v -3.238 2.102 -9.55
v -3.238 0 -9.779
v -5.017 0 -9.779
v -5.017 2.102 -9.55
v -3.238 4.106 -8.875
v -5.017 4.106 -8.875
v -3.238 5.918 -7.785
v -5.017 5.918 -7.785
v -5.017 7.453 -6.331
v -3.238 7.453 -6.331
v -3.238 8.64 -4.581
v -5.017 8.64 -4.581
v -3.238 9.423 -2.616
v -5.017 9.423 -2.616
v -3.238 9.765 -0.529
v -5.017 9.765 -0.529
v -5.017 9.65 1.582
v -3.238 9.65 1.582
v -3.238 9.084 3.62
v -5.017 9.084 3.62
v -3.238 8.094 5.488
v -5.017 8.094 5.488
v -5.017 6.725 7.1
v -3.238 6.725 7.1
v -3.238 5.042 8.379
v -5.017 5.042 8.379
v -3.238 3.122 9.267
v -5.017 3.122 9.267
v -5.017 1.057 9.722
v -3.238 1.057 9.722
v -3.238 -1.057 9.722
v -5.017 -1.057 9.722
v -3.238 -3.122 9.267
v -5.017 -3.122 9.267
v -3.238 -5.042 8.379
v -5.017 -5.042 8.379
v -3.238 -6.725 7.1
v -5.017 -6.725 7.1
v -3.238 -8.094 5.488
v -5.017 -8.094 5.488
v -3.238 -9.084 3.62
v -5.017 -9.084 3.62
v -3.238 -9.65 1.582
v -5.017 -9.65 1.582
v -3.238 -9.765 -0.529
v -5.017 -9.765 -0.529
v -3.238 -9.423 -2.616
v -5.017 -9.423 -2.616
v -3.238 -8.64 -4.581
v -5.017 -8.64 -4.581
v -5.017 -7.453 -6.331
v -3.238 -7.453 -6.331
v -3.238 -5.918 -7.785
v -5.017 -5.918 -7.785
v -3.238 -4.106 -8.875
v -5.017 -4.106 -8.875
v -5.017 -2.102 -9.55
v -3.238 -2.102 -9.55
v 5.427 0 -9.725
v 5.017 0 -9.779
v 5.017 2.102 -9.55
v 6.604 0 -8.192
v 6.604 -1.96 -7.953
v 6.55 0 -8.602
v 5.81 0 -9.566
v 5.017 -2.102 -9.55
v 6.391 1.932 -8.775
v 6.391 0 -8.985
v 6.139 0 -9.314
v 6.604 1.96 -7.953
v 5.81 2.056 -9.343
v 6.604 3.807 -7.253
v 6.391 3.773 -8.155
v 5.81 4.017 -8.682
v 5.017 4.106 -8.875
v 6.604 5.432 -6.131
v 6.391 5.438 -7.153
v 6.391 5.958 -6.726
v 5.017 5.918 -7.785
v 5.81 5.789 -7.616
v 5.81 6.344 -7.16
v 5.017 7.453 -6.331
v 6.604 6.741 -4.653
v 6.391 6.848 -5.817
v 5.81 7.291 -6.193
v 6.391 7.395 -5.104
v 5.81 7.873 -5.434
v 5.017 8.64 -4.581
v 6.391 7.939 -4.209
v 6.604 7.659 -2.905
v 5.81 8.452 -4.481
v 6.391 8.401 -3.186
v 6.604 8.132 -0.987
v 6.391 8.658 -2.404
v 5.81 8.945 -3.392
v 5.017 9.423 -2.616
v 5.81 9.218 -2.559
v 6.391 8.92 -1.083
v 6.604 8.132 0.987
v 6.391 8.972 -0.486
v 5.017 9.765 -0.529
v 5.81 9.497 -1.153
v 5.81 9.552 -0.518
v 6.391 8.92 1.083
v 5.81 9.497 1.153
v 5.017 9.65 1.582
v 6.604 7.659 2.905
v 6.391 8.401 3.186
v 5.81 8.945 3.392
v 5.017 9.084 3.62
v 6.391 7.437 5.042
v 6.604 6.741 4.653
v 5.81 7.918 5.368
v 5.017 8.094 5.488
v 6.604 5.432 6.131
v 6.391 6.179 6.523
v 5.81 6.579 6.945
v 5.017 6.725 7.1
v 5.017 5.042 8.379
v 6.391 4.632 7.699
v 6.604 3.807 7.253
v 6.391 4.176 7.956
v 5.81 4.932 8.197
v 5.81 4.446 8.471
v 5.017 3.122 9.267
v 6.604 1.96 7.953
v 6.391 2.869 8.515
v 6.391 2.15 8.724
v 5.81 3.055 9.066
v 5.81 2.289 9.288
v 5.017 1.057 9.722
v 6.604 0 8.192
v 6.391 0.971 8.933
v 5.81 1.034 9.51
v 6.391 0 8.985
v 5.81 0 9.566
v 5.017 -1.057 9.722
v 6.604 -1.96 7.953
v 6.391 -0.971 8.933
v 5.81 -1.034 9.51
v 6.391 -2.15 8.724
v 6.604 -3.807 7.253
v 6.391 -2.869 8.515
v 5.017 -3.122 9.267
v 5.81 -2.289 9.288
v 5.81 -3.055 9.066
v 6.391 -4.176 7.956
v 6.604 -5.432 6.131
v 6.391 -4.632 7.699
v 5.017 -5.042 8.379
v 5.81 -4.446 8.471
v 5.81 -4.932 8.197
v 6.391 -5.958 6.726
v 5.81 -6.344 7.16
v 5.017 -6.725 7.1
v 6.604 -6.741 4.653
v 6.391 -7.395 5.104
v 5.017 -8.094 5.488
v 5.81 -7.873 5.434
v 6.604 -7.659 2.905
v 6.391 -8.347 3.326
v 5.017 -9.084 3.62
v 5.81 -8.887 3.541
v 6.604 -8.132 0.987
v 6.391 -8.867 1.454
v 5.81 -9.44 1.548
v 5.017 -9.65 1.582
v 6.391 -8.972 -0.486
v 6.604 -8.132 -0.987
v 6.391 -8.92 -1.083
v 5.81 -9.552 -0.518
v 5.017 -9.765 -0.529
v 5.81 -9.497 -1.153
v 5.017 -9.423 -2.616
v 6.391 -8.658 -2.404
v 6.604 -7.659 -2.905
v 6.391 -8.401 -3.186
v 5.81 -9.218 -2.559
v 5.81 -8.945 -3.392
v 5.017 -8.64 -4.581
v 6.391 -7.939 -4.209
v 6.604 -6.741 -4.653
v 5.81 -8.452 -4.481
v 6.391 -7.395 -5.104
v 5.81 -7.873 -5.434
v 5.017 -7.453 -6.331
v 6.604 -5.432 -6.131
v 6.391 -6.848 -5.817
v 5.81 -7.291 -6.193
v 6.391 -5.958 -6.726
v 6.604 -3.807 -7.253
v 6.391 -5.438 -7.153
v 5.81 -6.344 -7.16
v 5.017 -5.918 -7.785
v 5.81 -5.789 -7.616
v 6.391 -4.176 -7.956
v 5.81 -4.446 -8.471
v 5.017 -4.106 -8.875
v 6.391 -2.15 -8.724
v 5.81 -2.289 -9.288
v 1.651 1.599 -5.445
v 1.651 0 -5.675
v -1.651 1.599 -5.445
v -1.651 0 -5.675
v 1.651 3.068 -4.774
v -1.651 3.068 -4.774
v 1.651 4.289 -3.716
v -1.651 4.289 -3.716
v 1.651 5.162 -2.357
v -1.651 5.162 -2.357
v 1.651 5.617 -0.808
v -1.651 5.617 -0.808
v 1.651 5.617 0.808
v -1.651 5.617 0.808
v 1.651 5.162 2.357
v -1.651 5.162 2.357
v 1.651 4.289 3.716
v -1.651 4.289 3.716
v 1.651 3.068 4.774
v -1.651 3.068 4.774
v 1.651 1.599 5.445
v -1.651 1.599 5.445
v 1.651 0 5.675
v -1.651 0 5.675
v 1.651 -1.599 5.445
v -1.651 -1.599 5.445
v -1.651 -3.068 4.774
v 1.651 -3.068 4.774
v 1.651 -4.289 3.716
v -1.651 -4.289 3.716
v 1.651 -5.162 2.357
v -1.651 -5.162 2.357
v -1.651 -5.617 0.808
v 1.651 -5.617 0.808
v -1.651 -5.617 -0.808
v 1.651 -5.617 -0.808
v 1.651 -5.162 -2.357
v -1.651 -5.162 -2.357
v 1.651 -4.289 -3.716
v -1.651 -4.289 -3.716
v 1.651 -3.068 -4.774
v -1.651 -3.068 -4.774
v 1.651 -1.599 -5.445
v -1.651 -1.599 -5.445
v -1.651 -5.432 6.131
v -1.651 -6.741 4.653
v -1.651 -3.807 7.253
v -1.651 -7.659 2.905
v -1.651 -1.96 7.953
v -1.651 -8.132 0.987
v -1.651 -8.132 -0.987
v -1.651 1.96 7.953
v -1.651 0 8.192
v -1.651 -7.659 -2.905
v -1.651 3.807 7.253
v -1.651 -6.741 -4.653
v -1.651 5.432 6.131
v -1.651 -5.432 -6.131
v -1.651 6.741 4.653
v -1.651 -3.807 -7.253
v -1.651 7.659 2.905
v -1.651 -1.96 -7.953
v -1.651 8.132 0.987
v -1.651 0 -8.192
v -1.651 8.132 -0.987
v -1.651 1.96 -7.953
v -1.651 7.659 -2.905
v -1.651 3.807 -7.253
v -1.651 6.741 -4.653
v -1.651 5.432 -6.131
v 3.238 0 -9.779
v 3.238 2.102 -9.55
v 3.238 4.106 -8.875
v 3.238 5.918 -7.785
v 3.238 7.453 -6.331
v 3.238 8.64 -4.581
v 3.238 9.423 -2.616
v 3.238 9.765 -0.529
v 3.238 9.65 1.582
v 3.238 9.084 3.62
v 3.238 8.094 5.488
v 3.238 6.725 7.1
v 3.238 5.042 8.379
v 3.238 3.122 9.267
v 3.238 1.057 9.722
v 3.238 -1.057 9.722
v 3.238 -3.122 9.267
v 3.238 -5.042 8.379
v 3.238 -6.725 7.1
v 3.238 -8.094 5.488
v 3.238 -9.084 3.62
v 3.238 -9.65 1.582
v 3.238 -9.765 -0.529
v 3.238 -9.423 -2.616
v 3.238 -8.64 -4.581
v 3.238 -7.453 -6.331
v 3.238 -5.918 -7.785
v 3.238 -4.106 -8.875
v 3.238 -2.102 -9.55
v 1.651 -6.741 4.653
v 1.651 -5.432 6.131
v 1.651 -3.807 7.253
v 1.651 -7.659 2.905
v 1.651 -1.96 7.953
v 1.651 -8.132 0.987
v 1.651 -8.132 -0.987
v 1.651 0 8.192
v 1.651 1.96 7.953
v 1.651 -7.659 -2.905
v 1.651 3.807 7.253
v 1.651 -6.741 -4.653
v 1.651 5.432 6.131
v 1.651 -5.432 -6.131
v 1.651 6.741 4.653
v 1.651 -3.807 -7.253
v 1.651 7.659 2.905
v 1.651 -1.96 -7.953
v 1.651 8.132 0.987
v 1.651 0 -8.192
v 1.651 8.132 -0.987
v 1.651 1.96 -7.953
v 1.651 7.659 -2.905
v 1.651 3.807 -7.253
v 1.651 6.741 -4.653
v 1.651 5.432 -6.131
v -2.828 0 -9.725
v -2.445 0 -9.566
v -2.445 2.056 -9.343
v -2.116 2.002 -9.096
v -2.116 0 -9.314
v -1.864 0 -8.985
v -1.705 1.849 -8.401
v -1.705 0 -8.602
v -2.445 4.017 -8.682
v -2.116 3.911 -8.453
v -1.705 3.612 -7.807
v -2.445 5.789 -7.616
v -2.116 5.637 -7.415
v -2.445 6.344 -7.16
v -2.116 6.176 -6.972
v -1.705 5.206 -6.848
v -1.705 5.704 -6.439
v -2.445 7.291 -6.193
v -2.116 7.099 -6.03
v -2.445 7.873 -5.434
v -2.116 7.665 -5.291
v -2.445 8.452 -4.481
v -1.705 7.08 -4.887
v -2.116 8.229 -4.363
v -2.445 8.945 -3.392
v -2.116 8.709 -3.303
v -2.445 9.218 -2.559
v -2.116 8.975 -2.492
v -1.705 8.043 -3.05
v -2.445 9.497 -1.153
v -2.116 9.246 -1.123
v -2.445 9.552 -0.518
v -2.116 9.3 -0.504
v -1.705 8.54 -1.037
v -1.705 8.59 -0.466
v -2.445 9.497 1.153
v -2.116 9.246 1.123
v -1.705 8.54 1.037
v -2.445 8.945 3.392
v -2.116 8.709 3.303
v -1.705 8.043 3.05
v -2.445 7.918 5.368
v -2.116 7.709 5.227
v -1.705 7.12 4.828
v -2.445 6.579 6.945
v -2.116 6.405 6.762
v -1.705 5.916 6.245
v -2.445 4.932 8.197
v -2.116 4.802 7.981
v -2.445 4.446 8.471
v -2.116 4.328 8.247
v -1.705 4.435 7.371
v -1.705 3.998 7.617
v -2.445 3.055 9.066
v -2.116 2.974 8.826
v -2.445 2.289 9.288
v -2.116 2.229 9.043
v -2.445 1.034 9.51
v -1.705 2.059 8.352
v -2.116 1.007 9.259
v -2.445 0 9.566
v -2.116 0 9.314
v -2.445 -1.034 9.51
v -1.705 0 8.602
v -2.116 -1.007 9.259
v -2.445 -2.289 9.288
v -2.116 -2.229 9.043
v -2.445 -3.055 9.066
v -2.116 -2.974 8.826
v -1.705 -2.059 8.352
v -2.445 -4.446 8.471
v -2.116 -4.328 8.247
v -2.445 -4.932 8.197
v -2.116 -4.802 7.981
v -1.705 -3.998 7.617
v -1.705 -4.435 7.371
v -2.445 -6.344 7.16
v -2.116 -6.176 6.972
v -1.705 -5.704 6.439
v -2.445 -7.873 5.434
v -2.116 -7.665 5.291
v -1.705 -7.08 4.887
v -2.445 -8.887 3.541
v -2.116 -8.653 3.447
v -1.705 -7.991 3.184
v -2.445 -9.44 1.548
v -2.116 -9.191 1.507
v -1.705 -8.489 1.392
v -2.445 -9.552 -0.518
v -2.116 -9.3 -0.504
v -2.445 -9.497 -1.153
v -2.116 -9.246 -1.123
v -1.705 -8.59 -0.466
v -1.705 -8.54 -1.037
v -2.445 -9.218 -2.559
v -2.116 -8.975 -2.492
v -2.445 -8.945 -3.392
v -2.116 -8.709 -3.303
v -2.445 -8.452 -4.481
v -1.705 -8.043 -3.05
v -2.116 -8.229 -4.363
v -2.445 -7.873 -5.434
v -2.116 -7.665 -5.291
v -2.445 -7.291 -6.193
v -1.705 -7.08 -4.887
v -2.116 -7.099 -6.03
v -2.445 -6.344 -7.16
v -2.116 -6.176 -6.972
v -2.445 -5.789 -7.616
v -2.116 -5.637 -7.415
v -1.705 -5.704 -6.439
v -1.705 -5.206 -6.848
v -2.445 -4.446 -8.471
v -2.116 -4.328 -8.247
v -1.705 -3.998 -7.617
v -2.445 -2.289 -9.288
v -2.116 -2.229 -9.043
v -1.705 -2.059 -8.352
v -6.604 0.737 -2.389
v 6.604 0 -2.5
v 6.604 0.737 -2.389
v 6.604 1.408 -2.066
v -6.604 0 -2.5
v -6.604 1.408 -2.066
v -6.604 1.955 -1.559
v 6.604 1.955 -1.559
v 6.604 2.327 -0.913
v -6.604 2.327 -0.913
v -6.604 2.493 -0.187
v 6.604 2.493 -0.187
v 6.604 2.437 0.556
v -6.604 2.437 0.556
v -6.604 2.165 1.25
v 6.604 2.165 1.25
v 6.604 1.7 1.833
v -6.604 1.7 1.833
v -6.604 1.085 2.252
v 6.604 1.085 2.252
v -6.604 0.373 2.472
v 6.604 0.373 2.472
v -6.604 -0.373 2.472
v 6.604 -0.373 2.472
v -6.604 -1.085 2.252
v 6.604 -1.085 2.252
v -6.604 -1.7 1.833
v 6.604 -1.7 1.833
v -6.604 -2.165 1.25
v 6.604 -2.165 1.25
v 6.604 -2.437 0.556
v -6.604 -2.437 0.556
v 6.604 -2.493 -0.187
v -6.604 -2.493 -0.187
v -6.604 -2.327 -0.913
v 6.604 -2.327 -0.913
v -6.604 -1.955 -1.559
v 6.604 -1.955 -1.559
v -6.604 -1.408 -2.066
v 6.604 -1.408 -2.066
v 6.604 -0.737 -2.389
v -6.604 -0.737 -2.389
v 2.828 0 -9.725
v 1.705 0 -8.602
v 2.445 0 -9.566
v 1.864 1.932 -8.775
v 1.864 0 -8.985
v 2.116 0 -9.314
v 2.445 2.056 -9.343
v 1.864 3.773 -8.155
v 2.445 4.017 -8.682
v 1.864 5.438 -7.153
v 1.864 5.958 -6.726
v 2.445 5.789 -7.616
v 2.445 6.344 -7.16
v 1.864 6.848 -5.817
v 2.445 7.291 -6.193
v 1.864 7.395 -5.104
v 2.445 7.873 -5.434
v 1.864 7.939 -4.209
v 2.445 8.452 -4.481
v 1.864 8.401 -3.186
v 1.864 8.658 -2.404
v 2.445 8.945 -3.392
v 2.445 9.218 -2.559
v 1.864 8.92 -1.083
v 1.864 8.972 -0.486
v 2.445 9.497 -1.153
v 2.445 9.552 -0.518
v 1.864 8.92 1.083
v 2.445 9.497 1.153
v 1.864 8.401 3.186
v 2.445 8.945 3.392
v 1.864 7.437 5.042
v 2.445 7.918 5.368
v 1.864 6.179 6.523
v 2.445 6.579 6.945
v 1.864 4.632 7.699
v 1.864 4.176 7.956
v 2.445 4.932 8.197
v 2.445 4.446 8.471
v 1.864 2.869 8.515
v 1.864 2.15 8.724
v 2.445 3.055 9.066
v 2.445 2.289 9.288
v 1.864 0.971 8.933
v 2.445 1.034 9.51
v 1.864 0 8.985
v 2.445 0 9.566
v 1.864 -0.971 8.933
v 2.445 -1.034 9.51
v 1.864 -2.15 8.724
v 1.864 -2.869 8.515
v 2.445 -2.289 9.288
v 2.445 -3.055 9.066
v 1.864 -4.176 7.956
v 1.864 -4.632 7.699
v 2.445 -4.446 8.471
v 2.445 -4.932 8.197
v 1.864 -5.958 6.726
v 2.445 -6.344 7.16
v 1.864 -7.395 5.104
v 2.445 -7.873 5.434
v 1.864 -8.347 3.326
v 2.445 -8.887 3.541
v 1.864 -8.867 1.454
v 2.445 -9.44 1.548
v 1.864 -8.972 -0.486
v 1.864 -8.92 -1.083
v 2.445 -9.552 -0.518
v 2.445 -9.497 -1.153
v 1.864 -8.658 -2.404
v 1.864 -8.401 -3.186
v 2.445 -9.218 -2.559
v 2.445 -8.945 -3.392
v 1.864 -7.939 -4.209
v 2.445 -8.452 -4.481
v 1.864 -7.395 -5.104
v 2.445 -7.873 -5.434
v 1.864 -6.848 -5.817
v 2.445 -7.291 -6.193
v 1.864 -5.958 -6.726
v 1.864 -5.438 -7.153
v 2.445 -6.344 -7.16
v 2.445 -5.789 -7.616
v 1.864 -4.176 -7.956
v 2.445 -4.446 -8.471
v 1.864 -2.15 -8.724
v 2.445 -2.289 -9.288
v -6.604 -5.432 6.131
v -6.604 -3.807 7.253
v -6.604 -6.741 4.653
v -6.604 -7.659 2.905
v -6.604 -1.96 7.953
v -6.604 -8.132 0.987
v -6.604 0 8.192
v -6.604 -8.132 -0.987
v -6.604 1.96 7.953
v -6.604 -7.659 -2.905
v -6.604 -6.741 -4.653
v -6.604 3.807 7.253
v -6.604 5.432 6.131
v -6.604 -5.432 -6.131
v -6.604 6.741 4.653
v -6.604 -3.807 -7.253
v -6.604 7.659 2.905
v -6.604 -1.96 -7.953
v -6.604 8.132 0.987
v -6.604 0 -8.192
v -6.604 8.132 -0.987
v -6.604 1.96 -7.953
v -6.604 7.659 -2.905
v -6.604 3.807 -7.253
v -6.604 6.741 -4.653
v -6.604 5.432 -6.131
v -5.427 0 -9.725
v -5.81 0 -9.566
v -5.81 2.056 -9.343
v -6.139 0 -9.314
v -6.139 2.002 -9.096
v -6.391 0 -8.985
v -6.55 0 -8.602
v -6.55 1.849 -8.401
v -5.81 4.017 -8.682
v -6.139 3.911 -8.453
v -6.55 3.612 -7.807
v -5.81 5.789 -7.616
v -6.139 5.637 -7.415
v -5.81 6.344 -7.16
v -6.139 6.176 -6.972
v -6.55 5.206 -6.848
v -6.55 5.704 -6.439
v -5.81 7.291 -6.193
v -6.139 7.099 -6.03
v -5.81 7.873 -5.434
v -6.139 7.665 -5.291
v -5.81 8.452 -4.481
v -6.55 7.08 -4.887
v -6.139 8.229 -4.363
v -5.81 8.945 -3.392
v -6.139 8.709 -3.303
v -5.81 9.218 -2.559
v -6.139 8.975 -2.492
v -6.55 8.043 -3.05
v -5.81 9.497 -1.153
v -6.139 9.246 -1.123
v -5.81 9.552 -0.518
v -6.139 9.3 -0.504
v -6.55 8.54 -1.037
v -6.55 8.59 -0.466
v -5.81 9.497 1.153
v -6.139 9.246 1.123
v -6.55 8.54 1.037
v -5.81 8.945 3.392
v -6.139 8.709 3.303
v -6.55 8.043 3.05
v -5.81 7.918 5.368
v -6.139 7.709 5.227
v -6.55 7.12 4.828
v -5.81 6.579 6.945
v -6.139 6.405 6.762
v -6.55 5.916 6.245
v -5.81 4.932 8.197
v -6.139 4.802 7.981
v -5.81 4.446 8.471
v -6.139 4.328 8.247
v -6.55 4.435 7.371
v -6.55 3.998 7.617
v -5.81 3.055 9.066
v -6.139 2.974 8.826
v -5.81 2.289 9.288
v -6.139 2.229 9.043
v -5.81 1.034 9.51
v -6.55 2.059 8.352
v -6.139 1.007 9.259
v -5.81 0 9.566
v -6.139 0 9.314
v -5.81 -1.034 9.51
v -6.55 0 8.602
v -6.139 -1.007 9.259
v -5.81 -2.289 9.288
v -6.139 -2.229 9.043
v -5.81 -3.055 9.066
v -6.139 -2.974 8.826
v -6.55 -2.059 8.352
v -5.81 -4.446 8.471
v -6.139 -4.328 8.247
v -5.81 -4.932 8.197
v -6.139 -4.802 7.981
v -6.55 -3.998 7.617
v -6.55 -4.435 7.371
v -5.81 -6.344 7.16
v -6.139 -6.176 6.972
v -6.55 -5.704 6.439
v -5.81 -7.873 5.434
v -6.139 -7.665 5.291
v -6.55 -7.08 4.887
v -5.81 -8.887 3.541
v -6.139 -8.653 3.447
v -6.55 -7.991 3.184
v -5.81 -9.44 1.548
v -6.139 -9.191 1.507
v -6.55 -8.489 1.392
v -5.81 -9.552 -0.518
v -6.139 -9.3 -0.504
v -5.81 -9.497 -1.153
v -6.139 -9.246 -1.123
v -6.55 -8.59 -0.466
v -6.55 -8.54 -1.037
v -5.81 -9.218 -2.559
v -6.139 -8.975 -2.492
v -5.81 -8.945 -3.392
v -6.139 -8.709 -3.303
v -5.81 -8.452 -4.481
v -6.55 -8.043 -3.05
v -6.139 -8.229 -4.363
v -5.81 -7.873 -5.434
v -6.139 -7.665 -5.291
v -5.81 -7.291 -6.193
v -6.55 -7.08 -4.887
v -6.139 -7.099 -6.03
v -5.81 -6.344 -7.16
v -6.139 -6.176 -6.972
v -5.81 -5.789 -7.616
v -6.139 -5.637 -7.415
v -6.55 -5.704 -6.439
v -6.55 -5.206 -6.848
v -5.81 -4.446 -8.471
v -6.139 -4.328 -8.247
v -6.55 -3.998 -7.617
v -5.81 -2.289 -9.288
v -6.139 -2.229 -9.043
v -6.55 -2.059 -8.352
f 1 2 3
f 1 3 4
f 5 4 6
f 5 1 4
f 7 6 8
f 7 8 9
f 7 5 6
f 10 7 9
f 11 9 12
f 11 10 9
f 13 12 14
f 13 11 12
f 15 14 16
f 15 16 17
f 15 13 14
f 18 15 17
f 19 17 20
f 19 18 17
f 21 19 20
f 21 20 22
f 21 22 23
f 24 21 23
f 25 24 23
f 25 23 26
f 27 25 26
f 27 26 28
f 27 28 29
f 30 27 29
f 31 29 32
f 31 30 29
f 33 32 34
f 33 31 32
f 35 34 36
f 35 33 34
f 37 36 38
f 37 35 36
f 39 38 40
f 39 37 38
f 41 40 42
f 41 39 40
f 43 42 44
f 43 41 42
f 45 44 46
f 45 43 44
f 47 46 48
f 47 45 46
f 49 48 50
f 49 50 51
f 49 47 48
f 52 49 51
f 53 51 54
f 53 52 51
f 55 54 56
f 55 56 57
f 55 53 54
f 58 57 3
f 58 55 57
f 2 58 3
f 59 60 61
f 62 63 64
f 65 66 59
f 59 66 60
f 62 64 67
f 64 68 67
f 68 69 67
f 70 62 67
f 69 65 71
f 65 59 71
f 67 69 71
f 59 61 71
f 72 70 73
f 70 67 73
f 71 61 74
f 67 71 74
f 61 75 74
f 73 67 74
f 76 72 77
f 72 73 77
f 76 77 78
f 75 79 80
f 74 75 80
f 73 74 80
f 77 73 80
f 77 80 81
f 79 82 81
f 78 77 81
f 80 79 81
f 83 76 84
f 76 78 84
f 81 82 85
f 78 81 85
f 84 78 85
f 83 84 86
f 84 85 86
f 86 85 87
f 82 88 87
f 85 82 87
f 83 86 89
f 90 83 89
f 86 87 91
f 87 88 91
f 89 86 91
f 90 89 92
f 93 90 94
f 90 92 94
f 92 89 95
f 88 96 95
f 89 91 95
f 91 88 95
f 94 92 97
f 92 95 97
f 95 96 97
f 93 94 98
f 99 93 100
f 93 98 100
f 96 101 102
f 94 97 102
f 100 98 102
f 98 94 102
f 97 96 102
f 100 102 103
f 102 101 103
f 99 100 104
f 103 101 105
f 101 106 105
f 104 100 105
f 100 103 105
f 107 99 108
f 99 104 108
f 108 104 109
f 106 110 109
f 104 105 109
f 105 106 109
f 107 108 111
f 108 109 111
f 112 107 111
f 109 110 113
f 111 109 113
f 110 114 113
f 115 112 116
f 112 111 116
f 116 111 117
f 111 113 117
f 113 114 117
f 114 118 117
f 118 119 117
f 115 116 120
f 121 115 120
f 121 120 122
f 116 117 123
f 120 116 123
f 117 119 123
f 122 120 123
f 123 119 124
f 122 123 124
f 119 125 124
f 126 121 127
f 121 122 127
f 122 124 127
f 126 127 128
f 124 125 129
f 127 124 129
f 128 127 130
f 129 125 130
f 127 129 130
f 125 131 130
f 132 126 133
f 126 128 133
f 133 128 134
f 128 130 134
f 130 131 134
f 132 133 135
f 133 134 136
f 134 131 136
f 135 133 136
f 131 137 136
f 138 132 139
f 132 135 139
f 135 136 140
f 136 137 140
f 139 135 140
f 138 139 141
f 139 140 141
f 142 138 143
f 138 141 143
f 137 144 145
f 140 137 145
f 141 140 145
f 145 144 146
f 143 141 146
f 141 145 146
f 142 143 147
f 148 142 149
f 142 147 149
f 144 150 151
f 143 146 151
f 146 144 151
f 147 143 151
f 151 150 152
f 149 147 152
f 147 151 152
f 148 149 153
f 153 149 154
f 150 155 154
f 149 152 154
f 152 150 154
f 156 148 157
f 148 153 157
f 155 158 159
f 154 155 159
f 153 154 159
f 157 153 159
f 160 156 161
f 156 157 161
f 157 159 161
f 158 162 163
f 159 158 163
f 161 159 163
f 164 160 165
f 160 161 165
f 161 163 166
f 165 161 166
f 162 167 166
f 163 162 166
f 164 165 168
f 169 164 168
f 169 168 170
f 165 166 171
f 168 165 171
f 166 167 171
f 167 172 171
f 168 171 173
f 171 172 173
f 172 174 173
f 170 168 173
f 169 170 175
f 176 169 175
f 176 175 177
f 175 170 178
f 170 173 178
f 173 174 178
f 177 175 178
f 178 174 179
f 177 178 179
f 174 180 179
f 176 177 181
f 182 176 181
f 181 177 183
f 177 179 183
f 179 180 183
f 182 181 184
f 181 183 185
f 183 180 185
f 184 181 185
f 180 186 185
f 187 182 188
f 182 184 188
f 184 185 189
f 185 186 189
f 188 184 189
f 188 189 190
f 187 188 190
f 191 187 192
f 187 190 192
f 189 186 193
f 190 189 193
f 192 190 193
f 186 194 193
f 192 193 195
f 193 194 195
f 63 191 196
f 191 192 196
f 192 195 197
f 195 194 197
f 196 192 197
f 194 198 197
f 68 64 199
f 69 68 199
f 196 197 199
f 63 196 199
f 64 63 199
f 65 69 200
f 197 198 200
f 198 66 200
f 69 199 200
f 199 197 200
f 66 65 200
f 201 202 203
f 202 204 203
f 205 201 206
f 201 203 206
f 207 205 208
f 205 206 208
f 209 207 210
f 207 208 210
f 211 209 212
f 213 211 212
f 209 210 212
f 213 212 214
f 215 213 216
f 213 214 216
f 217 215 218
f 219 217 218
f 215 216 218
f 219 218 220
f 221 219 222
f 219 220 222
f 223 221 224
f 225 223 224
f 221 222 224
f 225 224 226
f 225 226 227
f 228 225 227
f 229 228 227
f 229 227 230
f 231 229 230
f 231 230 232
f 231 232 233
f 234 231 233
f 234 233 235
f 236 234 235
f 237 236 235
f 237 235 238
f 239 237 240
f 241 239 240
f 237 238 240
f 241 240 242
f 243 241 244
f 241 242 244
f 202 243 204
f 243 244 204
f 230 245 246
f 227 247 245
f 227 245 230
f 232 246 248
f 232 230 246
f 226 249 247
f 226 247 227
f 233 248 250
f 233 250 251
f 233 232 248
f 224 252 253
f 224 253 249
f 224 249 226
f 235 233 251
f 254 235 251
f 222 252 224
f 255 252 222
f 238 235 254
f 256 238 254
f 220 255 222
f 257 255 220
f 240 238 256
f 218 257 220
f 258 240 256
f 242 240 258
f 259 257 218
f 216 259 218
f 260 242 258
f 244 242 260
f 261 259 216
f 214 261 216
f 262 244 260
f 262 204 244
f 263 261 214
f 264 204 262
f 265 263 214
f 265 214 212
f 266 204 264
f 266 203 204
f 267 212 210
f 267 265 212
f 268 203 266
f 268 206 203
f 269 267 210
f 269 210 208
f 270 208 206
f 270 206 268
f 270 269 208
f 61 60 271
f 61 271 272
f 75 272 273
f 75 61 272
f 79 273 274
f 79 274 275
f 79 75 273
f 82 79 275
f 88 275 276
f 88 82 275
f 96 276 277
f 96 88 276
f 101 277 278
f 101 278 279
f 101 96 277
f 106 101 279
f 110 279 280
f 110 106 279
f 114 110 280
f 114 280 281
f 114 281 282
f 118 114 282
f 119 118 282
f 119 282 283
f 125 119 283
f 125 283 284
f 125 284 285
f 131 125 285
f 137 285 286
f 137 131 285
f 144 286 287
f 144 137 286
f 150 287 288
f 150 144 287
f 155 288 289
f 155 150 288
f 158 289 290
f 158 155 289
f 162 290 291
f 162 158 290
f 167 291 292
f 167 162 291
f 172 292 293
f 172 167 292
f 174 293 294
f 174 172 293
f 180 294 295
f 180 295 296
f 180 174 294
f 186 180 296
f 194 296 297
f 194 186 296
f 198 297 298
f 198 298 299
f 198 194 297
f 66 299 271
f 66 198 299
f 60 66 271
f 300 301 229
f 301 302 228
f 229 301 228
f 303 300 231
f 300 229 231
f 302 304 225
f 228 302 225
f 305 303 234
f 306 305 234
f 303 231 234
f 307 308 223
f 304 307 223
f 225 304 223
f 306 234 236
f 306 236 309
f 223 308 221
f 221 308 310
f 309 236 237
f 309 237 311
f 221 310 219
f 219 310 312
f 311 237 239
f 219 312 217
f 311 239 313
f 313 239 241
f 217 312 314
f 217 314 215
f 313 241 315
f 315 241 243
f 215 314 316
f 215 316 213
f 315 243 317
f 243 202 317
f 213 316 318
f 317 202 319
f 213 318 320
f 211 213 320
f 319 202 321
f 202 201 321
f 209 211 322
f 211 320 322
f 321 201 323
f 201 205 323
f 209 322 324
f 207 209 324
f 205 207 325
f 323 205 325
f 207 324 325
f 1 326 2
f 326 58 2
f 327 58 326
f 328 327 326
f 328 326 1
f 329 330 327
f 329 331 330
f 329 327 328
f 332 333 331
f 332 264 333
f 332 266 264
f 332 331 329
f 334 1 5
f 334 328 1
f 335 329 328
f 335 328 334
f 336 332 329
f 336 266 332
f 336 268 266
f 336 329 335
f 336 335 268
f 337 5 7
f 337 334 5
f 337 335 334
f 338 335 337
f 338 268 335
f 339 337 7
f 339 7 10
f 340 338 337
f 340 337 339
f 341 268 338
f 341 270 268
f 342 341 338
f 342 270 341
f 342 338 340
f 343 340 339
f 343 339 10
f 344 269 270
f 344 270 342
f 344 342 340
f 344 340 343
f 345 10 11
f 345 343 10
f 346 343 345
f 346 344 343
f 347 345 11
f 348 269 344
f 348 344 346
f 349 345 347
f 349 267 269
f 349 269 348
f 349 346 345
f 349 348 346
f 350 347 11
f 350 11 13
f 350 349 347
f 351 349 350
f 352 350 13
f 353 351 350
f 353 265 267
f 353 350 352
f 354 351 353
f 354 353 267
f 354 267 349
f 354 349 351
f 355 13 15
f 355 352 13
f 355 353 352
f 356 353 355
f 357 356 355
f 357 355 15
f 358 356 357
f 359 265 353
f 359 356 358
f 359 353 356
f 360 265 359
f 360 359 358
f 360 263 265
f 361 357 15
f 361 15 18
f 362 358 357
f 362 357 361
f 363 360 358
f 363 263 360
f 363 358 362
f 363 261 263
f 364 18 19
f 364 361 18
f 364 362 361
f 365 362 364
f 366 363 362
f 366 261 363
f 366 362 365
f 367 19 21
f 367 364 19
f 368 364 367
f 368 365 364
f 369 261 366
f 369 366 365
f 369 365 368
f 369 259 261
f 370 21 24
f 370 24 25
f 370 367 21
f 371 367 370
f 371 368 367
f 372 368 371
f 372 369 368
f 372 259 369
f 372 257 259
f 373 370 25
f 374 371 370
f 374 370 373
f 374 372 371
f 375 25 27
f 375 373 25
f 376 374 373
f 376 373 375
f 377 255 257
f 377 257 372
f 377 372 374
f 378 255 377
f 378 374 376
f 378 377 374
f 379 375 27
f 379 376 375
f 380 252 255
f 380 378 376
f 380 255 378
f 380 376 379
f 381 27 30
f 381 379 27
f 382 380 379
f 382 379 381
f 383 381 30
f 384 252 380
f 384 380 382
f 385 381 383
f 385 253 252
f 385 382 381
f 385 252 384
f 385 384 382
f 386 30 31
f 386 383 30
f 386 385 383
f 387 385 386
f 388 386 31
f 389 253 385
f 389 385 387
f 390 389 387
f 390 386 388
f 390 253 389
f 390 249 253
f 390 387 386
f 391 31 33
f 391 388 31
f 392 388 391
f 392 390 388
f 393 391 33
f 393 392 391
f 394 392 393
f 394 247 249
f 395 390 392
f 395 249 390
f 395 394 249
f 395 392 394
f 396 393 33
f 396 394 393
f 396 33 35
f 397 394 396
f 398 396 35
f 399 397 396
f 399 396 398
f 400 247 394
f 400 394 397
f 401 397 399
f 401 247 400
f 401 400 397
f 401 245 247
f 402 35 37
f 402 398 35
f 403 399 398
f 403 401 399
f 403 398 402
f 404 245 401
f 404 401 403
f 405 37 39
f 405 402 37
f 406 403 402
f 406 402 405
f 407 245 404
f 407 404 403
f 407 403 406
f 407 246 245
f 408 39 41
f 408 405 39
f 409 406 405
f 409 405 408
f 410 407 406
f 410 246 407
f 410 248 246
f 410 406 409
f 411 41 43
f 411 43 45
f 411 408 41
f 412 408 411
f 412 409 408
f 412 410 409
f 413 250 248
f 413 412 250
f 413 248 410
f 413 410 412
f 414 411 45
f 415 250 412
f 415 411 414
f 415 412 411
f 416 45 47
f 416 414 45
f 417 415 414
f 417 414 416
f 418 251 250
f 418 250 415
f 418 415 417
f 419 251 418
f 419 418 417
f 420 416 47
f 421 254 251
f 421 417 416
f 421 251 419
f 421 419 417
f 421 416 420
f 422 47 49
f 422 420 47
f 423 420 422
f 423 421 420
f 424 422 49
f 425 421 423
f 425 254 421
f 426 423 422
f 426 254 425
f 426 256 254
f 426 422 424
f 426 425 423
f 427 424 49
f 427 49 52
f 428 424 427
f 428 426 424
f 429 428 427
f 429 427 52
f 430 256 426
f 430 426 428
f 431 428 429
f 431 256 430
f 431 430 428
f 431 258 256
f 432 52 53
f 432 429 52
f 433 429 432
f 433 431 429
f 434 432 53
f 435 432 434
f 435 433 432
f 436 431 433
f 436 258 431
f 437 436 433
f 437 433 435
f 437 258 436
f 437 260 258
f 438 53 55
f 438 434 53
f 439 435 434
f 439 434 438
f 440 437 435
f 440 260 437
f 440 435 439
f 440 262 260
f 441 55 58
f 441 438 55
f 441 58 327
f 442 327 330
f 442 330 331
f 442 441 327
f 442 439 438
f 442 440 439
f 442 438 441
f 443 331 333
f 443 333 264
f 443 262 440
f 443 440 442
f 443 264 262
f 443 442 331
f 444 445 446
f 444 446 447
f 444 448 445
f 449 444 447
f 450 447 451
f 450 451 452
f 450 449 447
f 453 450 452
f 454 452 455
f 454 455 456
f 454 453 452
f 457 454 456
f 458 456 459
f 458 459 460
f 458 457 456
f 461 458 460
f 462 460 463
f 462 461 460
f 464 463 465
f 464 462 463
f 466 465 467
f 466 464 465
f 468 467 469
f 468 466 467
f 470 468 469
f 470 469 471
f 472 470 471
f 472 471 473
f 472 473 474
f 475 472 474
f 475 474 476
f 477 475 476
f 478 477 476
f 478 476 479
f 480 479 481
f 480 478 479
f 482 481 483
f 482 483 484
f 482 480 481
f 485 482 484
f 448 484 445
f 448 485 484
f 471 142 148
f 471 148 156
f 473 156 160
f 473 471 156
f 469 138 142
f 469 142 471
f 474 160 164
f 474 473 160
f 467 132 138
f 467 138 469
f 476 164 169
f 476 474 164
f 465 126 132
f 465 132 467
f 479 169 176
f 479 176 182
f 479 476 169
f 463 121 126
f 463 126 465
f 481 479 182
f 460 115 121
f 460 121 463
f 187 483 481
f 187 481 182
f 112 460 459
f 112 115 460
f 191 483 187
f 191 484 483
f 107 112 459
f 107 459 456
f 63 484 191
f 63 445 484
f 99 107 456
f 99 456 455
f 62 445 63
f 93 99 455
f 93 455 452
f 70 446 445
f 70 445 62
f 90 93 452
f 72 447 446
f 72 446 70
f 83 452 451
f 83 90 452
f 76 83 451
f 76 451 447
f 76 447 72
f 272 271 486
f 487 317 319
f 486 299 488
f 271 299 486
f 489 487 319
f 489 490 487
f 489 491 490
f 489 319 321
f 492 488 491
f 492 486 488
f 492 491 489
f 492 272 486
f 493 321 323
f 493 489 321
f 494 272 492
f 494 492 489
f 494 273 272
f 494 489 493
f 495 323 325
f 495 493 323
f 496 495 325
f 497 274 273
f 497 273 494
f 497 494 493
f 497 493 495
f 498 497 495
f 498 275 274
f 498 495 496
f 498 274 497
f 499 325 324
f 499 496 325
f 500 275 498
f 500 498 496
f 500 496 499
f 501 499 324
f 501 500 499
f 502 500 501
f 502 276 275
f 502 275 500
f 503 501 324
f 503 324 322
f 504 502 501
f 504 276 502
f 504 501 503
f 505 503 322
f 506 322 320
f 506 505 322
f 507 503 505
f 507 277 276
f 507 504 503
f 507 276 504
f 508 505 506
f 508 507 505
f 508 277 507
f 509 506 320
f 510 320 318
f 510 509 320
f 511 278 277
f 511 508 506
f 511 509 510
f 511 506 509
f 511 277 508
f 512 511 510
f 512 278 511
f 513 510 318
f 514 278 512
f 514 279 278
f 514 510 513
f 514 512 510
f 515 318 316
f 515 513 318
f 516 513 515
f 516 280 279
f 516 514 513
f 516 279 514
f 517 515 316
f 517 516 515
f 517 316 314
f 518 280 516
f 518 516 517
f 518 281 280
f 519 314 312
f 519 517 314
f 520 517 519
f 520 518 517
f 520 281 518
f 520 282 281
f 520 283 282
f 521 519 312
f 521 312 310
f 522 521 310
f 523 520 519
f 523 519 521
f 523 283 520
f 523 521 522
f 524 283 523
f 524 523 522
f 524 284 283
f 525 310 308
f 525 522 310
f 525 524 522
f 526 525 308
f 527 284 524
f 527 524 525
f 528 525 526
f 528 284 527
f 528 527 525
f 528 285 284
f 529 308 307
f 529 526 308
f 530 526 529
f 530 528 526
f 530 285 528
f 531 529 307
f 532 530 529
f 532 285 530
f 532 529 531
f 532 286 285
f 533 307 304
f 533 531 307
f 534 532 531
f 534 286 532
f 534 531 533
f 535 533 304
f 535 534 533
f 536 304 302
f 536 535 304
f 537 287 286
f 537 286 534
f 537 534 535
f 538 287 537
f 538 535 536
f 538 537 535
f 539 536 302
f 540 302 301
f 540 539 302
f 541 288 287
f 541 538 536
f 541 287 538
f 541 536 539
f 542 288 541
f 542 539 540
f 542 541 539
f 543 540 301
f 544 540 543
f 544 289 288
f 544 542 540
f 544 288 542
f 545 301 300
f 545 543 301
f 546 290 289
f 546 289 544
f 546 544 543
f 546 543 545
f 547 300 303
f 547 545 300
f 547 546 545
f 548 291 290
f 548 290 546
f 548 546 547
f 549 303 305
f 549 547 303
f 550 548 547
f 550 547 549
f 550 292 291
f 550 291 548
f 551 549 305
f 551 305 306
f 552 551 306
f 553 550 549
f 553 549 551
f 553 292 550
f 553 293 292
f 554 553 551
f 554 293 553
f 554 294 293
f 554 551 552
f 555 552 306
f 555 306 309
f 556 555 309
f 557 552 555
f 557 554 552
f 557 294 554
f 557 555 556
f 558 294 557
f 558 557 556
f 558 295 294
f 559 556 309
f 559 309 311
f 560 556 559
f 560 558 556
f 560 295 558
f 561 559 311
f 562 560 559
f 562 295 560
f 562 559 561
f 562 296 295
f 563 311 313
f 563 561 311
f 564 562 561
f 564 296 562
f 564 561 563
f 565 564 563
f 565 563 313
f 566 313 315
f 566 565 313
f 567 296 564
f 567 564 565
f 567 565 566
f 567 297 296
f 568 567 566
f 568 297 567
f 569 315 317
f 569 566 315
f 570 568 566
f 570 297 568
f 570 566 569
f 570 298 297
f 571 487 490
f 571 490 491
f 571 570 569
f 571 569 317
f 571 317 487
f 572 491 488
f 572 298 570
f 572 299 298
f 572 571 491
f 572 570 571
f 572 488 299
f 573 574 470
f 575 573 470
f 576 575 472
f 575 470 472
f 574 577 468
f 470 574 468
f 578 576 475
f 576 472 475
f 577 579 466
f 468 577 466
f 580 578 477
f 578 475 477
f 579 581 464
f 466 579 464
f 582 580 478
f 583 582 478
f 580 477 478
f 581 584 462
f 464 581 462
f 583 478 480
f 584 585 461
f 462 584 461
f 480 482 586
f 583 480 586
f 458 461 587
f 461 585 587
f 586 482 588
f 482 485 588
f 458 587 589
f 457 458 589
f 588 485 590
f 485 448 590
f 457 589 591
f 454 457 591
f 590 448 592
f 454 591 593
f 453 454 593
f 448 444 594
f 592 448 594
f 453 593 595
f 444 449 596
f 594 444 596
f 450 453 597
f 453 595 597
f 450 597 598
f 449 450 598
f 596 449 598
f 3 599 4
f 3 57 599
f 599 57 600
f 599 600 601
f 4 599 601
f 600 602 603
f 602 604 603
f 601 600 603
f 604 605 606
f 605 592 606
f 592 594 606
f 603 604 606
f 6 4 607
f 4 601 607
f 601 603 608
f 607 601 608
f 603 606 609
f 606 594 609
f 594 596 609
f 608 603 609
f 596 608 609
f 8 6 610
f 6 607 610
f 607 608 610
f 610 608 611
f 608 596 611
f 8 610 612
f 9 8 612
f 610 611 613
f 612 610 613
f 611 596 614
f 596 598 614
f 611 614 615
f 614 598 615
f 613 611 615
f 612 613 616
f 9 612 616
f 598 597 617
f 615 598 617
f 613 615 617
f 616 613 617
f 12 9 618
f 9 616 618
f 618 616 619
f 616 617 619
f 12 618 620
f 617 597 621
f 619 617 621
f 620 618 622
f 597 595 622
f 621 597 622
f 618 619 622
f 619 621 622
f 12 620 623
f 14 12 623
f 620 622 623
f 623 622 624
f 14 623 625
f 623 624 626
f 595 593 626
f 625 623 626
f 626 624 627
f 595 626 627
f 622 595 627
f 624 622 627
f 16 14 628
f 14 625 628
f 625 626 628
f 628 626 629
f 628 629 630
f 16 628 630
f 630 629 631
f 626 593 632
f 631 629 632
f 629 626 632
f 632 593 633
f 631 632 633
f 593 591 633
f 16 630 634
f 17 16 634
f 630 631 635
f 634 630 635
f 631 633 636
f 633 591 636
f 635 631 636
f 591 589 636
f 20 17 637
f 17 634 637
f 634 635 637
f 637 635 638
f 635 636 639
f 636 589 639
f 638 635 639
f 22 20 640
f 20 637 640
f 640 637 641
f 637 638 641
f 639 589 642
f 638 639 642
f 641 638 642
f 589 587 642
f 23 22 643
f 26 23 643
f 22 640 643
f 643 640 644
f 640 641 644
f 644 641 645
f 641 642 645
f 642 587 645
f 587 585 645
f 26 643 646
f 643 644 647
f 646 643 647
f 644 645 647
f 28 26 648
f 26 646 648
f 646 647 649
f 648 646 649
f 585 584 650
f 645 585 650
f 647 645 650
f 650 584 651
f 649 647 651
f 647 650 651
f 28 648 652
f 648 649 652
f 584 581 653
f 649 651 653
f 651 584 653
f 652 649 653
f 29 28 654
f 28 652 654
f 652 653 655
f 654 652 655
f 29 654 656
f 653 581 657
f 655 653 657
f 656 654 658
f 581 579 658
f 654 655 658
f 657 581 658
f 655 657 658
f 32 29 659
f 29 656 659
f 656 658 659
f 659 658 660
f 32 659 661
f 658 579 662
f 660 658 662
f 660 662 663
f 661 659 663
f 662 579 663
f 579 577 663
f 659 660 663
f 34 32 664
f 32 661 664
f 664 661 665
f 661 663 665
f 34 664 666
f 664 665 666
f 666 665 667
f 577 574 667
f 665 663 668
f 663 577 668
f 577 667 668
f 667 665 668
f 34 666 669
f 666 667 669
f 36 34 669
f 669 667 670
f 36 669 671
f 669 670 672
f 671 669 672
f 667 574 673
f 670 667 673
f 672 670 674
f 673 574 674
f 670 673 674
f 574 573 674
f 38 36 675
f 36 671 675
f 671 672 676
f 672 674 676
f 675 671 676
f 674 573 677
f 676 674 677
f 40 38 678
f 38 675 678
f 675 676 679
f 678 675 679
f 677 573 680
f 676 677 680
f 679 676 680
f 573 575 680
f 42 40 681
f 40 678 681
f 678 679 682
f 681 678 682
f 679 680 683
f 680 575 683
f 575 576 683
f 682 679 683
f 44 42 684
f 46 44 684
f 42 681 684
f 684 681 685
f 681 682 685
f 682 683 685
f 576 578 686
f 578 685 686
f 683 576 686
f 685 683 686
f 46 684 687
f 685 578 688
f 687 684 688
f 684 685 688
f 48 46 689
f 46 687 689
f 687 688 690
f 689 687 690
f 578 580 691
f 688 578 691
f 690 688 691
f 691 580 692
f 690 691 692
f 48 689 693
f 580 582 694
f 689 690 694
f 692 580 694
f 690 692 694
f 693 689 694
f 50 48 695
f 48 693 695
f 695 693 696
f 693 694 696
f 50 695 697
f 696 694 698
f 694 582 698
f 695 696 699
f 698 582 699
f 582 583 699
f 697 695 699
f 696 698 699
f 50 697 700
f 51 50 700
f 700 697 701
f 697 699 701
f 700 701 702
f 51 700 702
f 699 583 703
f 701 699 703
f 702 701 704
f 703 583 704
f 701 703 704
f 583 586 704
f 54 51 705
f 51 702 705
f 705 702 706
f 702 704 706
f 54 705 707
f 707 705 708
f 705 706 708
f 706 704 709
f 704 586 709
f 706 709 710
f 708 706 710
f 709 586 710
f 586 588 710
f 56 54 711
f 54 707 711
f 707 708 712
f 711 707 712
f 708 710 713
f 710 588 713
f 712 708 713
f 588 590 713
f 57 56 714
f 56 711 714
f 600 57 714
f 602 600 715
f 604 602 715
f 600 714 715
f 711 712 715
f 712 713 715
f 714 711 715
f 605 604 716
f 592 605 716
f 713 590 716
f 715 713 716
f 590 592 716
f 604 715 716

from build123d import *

# Parameters (mm, degrees)
SKETCH1_R           = 9.779
SKETCH1_R_2         = 2.5
BOSS_EXTRUDE1_DEPTH = 6.604
SKETCH2_R           = 11.049
SKETCH2_R_2         = 5.675
CUT_EXTRUDE1_DEPTH  = 1.651
FILLET1_R           = 1.5875


with BuildPart() as part:
    # Sketch1 → Boss-Extrude1 (new body, symmetric)
    with BuildSketch(Plane(origin=(0, 0, 0), x_dir=(0, 0, -1), z_dir=(1, 0, 0))):
        Circle(SKETCH1_R)
        Circle(SKETCH1_R_2, mode=Mode.SUBTRACT)
    extrude(amount=BOSS_EXTRUDE1_DEPTH, both=True)

    # Sketch2 → Cut-Extrude1 (cut, symmetric)
    with BuildSketch(Plane(origin=(0, 0, 0), x_dir=(0, 0, -1), z_dir=(1, 0, 0))):
        Circle(SKETCH2_R)
        Circle(SKETCH2_R_2, mode=Mode.SUBTRACT)
    extrude(amount=CUT_EXTRUDE1_DEPTH, both=True, mode=Mode.SUBTRACT)

    # Fillet1
    fillet1_edges = [part.edges().sort_by_distance(p)[0] for p in [
        (1.651, 0, 9.779),
        (-1.651, 0, 9.779),
        (-6.604, 0, 9.779),
        (6.604, 0, 9.779),
    ]]
    fillet(fillet1_edges, radius=FILLET1_R)


solid = part.part
